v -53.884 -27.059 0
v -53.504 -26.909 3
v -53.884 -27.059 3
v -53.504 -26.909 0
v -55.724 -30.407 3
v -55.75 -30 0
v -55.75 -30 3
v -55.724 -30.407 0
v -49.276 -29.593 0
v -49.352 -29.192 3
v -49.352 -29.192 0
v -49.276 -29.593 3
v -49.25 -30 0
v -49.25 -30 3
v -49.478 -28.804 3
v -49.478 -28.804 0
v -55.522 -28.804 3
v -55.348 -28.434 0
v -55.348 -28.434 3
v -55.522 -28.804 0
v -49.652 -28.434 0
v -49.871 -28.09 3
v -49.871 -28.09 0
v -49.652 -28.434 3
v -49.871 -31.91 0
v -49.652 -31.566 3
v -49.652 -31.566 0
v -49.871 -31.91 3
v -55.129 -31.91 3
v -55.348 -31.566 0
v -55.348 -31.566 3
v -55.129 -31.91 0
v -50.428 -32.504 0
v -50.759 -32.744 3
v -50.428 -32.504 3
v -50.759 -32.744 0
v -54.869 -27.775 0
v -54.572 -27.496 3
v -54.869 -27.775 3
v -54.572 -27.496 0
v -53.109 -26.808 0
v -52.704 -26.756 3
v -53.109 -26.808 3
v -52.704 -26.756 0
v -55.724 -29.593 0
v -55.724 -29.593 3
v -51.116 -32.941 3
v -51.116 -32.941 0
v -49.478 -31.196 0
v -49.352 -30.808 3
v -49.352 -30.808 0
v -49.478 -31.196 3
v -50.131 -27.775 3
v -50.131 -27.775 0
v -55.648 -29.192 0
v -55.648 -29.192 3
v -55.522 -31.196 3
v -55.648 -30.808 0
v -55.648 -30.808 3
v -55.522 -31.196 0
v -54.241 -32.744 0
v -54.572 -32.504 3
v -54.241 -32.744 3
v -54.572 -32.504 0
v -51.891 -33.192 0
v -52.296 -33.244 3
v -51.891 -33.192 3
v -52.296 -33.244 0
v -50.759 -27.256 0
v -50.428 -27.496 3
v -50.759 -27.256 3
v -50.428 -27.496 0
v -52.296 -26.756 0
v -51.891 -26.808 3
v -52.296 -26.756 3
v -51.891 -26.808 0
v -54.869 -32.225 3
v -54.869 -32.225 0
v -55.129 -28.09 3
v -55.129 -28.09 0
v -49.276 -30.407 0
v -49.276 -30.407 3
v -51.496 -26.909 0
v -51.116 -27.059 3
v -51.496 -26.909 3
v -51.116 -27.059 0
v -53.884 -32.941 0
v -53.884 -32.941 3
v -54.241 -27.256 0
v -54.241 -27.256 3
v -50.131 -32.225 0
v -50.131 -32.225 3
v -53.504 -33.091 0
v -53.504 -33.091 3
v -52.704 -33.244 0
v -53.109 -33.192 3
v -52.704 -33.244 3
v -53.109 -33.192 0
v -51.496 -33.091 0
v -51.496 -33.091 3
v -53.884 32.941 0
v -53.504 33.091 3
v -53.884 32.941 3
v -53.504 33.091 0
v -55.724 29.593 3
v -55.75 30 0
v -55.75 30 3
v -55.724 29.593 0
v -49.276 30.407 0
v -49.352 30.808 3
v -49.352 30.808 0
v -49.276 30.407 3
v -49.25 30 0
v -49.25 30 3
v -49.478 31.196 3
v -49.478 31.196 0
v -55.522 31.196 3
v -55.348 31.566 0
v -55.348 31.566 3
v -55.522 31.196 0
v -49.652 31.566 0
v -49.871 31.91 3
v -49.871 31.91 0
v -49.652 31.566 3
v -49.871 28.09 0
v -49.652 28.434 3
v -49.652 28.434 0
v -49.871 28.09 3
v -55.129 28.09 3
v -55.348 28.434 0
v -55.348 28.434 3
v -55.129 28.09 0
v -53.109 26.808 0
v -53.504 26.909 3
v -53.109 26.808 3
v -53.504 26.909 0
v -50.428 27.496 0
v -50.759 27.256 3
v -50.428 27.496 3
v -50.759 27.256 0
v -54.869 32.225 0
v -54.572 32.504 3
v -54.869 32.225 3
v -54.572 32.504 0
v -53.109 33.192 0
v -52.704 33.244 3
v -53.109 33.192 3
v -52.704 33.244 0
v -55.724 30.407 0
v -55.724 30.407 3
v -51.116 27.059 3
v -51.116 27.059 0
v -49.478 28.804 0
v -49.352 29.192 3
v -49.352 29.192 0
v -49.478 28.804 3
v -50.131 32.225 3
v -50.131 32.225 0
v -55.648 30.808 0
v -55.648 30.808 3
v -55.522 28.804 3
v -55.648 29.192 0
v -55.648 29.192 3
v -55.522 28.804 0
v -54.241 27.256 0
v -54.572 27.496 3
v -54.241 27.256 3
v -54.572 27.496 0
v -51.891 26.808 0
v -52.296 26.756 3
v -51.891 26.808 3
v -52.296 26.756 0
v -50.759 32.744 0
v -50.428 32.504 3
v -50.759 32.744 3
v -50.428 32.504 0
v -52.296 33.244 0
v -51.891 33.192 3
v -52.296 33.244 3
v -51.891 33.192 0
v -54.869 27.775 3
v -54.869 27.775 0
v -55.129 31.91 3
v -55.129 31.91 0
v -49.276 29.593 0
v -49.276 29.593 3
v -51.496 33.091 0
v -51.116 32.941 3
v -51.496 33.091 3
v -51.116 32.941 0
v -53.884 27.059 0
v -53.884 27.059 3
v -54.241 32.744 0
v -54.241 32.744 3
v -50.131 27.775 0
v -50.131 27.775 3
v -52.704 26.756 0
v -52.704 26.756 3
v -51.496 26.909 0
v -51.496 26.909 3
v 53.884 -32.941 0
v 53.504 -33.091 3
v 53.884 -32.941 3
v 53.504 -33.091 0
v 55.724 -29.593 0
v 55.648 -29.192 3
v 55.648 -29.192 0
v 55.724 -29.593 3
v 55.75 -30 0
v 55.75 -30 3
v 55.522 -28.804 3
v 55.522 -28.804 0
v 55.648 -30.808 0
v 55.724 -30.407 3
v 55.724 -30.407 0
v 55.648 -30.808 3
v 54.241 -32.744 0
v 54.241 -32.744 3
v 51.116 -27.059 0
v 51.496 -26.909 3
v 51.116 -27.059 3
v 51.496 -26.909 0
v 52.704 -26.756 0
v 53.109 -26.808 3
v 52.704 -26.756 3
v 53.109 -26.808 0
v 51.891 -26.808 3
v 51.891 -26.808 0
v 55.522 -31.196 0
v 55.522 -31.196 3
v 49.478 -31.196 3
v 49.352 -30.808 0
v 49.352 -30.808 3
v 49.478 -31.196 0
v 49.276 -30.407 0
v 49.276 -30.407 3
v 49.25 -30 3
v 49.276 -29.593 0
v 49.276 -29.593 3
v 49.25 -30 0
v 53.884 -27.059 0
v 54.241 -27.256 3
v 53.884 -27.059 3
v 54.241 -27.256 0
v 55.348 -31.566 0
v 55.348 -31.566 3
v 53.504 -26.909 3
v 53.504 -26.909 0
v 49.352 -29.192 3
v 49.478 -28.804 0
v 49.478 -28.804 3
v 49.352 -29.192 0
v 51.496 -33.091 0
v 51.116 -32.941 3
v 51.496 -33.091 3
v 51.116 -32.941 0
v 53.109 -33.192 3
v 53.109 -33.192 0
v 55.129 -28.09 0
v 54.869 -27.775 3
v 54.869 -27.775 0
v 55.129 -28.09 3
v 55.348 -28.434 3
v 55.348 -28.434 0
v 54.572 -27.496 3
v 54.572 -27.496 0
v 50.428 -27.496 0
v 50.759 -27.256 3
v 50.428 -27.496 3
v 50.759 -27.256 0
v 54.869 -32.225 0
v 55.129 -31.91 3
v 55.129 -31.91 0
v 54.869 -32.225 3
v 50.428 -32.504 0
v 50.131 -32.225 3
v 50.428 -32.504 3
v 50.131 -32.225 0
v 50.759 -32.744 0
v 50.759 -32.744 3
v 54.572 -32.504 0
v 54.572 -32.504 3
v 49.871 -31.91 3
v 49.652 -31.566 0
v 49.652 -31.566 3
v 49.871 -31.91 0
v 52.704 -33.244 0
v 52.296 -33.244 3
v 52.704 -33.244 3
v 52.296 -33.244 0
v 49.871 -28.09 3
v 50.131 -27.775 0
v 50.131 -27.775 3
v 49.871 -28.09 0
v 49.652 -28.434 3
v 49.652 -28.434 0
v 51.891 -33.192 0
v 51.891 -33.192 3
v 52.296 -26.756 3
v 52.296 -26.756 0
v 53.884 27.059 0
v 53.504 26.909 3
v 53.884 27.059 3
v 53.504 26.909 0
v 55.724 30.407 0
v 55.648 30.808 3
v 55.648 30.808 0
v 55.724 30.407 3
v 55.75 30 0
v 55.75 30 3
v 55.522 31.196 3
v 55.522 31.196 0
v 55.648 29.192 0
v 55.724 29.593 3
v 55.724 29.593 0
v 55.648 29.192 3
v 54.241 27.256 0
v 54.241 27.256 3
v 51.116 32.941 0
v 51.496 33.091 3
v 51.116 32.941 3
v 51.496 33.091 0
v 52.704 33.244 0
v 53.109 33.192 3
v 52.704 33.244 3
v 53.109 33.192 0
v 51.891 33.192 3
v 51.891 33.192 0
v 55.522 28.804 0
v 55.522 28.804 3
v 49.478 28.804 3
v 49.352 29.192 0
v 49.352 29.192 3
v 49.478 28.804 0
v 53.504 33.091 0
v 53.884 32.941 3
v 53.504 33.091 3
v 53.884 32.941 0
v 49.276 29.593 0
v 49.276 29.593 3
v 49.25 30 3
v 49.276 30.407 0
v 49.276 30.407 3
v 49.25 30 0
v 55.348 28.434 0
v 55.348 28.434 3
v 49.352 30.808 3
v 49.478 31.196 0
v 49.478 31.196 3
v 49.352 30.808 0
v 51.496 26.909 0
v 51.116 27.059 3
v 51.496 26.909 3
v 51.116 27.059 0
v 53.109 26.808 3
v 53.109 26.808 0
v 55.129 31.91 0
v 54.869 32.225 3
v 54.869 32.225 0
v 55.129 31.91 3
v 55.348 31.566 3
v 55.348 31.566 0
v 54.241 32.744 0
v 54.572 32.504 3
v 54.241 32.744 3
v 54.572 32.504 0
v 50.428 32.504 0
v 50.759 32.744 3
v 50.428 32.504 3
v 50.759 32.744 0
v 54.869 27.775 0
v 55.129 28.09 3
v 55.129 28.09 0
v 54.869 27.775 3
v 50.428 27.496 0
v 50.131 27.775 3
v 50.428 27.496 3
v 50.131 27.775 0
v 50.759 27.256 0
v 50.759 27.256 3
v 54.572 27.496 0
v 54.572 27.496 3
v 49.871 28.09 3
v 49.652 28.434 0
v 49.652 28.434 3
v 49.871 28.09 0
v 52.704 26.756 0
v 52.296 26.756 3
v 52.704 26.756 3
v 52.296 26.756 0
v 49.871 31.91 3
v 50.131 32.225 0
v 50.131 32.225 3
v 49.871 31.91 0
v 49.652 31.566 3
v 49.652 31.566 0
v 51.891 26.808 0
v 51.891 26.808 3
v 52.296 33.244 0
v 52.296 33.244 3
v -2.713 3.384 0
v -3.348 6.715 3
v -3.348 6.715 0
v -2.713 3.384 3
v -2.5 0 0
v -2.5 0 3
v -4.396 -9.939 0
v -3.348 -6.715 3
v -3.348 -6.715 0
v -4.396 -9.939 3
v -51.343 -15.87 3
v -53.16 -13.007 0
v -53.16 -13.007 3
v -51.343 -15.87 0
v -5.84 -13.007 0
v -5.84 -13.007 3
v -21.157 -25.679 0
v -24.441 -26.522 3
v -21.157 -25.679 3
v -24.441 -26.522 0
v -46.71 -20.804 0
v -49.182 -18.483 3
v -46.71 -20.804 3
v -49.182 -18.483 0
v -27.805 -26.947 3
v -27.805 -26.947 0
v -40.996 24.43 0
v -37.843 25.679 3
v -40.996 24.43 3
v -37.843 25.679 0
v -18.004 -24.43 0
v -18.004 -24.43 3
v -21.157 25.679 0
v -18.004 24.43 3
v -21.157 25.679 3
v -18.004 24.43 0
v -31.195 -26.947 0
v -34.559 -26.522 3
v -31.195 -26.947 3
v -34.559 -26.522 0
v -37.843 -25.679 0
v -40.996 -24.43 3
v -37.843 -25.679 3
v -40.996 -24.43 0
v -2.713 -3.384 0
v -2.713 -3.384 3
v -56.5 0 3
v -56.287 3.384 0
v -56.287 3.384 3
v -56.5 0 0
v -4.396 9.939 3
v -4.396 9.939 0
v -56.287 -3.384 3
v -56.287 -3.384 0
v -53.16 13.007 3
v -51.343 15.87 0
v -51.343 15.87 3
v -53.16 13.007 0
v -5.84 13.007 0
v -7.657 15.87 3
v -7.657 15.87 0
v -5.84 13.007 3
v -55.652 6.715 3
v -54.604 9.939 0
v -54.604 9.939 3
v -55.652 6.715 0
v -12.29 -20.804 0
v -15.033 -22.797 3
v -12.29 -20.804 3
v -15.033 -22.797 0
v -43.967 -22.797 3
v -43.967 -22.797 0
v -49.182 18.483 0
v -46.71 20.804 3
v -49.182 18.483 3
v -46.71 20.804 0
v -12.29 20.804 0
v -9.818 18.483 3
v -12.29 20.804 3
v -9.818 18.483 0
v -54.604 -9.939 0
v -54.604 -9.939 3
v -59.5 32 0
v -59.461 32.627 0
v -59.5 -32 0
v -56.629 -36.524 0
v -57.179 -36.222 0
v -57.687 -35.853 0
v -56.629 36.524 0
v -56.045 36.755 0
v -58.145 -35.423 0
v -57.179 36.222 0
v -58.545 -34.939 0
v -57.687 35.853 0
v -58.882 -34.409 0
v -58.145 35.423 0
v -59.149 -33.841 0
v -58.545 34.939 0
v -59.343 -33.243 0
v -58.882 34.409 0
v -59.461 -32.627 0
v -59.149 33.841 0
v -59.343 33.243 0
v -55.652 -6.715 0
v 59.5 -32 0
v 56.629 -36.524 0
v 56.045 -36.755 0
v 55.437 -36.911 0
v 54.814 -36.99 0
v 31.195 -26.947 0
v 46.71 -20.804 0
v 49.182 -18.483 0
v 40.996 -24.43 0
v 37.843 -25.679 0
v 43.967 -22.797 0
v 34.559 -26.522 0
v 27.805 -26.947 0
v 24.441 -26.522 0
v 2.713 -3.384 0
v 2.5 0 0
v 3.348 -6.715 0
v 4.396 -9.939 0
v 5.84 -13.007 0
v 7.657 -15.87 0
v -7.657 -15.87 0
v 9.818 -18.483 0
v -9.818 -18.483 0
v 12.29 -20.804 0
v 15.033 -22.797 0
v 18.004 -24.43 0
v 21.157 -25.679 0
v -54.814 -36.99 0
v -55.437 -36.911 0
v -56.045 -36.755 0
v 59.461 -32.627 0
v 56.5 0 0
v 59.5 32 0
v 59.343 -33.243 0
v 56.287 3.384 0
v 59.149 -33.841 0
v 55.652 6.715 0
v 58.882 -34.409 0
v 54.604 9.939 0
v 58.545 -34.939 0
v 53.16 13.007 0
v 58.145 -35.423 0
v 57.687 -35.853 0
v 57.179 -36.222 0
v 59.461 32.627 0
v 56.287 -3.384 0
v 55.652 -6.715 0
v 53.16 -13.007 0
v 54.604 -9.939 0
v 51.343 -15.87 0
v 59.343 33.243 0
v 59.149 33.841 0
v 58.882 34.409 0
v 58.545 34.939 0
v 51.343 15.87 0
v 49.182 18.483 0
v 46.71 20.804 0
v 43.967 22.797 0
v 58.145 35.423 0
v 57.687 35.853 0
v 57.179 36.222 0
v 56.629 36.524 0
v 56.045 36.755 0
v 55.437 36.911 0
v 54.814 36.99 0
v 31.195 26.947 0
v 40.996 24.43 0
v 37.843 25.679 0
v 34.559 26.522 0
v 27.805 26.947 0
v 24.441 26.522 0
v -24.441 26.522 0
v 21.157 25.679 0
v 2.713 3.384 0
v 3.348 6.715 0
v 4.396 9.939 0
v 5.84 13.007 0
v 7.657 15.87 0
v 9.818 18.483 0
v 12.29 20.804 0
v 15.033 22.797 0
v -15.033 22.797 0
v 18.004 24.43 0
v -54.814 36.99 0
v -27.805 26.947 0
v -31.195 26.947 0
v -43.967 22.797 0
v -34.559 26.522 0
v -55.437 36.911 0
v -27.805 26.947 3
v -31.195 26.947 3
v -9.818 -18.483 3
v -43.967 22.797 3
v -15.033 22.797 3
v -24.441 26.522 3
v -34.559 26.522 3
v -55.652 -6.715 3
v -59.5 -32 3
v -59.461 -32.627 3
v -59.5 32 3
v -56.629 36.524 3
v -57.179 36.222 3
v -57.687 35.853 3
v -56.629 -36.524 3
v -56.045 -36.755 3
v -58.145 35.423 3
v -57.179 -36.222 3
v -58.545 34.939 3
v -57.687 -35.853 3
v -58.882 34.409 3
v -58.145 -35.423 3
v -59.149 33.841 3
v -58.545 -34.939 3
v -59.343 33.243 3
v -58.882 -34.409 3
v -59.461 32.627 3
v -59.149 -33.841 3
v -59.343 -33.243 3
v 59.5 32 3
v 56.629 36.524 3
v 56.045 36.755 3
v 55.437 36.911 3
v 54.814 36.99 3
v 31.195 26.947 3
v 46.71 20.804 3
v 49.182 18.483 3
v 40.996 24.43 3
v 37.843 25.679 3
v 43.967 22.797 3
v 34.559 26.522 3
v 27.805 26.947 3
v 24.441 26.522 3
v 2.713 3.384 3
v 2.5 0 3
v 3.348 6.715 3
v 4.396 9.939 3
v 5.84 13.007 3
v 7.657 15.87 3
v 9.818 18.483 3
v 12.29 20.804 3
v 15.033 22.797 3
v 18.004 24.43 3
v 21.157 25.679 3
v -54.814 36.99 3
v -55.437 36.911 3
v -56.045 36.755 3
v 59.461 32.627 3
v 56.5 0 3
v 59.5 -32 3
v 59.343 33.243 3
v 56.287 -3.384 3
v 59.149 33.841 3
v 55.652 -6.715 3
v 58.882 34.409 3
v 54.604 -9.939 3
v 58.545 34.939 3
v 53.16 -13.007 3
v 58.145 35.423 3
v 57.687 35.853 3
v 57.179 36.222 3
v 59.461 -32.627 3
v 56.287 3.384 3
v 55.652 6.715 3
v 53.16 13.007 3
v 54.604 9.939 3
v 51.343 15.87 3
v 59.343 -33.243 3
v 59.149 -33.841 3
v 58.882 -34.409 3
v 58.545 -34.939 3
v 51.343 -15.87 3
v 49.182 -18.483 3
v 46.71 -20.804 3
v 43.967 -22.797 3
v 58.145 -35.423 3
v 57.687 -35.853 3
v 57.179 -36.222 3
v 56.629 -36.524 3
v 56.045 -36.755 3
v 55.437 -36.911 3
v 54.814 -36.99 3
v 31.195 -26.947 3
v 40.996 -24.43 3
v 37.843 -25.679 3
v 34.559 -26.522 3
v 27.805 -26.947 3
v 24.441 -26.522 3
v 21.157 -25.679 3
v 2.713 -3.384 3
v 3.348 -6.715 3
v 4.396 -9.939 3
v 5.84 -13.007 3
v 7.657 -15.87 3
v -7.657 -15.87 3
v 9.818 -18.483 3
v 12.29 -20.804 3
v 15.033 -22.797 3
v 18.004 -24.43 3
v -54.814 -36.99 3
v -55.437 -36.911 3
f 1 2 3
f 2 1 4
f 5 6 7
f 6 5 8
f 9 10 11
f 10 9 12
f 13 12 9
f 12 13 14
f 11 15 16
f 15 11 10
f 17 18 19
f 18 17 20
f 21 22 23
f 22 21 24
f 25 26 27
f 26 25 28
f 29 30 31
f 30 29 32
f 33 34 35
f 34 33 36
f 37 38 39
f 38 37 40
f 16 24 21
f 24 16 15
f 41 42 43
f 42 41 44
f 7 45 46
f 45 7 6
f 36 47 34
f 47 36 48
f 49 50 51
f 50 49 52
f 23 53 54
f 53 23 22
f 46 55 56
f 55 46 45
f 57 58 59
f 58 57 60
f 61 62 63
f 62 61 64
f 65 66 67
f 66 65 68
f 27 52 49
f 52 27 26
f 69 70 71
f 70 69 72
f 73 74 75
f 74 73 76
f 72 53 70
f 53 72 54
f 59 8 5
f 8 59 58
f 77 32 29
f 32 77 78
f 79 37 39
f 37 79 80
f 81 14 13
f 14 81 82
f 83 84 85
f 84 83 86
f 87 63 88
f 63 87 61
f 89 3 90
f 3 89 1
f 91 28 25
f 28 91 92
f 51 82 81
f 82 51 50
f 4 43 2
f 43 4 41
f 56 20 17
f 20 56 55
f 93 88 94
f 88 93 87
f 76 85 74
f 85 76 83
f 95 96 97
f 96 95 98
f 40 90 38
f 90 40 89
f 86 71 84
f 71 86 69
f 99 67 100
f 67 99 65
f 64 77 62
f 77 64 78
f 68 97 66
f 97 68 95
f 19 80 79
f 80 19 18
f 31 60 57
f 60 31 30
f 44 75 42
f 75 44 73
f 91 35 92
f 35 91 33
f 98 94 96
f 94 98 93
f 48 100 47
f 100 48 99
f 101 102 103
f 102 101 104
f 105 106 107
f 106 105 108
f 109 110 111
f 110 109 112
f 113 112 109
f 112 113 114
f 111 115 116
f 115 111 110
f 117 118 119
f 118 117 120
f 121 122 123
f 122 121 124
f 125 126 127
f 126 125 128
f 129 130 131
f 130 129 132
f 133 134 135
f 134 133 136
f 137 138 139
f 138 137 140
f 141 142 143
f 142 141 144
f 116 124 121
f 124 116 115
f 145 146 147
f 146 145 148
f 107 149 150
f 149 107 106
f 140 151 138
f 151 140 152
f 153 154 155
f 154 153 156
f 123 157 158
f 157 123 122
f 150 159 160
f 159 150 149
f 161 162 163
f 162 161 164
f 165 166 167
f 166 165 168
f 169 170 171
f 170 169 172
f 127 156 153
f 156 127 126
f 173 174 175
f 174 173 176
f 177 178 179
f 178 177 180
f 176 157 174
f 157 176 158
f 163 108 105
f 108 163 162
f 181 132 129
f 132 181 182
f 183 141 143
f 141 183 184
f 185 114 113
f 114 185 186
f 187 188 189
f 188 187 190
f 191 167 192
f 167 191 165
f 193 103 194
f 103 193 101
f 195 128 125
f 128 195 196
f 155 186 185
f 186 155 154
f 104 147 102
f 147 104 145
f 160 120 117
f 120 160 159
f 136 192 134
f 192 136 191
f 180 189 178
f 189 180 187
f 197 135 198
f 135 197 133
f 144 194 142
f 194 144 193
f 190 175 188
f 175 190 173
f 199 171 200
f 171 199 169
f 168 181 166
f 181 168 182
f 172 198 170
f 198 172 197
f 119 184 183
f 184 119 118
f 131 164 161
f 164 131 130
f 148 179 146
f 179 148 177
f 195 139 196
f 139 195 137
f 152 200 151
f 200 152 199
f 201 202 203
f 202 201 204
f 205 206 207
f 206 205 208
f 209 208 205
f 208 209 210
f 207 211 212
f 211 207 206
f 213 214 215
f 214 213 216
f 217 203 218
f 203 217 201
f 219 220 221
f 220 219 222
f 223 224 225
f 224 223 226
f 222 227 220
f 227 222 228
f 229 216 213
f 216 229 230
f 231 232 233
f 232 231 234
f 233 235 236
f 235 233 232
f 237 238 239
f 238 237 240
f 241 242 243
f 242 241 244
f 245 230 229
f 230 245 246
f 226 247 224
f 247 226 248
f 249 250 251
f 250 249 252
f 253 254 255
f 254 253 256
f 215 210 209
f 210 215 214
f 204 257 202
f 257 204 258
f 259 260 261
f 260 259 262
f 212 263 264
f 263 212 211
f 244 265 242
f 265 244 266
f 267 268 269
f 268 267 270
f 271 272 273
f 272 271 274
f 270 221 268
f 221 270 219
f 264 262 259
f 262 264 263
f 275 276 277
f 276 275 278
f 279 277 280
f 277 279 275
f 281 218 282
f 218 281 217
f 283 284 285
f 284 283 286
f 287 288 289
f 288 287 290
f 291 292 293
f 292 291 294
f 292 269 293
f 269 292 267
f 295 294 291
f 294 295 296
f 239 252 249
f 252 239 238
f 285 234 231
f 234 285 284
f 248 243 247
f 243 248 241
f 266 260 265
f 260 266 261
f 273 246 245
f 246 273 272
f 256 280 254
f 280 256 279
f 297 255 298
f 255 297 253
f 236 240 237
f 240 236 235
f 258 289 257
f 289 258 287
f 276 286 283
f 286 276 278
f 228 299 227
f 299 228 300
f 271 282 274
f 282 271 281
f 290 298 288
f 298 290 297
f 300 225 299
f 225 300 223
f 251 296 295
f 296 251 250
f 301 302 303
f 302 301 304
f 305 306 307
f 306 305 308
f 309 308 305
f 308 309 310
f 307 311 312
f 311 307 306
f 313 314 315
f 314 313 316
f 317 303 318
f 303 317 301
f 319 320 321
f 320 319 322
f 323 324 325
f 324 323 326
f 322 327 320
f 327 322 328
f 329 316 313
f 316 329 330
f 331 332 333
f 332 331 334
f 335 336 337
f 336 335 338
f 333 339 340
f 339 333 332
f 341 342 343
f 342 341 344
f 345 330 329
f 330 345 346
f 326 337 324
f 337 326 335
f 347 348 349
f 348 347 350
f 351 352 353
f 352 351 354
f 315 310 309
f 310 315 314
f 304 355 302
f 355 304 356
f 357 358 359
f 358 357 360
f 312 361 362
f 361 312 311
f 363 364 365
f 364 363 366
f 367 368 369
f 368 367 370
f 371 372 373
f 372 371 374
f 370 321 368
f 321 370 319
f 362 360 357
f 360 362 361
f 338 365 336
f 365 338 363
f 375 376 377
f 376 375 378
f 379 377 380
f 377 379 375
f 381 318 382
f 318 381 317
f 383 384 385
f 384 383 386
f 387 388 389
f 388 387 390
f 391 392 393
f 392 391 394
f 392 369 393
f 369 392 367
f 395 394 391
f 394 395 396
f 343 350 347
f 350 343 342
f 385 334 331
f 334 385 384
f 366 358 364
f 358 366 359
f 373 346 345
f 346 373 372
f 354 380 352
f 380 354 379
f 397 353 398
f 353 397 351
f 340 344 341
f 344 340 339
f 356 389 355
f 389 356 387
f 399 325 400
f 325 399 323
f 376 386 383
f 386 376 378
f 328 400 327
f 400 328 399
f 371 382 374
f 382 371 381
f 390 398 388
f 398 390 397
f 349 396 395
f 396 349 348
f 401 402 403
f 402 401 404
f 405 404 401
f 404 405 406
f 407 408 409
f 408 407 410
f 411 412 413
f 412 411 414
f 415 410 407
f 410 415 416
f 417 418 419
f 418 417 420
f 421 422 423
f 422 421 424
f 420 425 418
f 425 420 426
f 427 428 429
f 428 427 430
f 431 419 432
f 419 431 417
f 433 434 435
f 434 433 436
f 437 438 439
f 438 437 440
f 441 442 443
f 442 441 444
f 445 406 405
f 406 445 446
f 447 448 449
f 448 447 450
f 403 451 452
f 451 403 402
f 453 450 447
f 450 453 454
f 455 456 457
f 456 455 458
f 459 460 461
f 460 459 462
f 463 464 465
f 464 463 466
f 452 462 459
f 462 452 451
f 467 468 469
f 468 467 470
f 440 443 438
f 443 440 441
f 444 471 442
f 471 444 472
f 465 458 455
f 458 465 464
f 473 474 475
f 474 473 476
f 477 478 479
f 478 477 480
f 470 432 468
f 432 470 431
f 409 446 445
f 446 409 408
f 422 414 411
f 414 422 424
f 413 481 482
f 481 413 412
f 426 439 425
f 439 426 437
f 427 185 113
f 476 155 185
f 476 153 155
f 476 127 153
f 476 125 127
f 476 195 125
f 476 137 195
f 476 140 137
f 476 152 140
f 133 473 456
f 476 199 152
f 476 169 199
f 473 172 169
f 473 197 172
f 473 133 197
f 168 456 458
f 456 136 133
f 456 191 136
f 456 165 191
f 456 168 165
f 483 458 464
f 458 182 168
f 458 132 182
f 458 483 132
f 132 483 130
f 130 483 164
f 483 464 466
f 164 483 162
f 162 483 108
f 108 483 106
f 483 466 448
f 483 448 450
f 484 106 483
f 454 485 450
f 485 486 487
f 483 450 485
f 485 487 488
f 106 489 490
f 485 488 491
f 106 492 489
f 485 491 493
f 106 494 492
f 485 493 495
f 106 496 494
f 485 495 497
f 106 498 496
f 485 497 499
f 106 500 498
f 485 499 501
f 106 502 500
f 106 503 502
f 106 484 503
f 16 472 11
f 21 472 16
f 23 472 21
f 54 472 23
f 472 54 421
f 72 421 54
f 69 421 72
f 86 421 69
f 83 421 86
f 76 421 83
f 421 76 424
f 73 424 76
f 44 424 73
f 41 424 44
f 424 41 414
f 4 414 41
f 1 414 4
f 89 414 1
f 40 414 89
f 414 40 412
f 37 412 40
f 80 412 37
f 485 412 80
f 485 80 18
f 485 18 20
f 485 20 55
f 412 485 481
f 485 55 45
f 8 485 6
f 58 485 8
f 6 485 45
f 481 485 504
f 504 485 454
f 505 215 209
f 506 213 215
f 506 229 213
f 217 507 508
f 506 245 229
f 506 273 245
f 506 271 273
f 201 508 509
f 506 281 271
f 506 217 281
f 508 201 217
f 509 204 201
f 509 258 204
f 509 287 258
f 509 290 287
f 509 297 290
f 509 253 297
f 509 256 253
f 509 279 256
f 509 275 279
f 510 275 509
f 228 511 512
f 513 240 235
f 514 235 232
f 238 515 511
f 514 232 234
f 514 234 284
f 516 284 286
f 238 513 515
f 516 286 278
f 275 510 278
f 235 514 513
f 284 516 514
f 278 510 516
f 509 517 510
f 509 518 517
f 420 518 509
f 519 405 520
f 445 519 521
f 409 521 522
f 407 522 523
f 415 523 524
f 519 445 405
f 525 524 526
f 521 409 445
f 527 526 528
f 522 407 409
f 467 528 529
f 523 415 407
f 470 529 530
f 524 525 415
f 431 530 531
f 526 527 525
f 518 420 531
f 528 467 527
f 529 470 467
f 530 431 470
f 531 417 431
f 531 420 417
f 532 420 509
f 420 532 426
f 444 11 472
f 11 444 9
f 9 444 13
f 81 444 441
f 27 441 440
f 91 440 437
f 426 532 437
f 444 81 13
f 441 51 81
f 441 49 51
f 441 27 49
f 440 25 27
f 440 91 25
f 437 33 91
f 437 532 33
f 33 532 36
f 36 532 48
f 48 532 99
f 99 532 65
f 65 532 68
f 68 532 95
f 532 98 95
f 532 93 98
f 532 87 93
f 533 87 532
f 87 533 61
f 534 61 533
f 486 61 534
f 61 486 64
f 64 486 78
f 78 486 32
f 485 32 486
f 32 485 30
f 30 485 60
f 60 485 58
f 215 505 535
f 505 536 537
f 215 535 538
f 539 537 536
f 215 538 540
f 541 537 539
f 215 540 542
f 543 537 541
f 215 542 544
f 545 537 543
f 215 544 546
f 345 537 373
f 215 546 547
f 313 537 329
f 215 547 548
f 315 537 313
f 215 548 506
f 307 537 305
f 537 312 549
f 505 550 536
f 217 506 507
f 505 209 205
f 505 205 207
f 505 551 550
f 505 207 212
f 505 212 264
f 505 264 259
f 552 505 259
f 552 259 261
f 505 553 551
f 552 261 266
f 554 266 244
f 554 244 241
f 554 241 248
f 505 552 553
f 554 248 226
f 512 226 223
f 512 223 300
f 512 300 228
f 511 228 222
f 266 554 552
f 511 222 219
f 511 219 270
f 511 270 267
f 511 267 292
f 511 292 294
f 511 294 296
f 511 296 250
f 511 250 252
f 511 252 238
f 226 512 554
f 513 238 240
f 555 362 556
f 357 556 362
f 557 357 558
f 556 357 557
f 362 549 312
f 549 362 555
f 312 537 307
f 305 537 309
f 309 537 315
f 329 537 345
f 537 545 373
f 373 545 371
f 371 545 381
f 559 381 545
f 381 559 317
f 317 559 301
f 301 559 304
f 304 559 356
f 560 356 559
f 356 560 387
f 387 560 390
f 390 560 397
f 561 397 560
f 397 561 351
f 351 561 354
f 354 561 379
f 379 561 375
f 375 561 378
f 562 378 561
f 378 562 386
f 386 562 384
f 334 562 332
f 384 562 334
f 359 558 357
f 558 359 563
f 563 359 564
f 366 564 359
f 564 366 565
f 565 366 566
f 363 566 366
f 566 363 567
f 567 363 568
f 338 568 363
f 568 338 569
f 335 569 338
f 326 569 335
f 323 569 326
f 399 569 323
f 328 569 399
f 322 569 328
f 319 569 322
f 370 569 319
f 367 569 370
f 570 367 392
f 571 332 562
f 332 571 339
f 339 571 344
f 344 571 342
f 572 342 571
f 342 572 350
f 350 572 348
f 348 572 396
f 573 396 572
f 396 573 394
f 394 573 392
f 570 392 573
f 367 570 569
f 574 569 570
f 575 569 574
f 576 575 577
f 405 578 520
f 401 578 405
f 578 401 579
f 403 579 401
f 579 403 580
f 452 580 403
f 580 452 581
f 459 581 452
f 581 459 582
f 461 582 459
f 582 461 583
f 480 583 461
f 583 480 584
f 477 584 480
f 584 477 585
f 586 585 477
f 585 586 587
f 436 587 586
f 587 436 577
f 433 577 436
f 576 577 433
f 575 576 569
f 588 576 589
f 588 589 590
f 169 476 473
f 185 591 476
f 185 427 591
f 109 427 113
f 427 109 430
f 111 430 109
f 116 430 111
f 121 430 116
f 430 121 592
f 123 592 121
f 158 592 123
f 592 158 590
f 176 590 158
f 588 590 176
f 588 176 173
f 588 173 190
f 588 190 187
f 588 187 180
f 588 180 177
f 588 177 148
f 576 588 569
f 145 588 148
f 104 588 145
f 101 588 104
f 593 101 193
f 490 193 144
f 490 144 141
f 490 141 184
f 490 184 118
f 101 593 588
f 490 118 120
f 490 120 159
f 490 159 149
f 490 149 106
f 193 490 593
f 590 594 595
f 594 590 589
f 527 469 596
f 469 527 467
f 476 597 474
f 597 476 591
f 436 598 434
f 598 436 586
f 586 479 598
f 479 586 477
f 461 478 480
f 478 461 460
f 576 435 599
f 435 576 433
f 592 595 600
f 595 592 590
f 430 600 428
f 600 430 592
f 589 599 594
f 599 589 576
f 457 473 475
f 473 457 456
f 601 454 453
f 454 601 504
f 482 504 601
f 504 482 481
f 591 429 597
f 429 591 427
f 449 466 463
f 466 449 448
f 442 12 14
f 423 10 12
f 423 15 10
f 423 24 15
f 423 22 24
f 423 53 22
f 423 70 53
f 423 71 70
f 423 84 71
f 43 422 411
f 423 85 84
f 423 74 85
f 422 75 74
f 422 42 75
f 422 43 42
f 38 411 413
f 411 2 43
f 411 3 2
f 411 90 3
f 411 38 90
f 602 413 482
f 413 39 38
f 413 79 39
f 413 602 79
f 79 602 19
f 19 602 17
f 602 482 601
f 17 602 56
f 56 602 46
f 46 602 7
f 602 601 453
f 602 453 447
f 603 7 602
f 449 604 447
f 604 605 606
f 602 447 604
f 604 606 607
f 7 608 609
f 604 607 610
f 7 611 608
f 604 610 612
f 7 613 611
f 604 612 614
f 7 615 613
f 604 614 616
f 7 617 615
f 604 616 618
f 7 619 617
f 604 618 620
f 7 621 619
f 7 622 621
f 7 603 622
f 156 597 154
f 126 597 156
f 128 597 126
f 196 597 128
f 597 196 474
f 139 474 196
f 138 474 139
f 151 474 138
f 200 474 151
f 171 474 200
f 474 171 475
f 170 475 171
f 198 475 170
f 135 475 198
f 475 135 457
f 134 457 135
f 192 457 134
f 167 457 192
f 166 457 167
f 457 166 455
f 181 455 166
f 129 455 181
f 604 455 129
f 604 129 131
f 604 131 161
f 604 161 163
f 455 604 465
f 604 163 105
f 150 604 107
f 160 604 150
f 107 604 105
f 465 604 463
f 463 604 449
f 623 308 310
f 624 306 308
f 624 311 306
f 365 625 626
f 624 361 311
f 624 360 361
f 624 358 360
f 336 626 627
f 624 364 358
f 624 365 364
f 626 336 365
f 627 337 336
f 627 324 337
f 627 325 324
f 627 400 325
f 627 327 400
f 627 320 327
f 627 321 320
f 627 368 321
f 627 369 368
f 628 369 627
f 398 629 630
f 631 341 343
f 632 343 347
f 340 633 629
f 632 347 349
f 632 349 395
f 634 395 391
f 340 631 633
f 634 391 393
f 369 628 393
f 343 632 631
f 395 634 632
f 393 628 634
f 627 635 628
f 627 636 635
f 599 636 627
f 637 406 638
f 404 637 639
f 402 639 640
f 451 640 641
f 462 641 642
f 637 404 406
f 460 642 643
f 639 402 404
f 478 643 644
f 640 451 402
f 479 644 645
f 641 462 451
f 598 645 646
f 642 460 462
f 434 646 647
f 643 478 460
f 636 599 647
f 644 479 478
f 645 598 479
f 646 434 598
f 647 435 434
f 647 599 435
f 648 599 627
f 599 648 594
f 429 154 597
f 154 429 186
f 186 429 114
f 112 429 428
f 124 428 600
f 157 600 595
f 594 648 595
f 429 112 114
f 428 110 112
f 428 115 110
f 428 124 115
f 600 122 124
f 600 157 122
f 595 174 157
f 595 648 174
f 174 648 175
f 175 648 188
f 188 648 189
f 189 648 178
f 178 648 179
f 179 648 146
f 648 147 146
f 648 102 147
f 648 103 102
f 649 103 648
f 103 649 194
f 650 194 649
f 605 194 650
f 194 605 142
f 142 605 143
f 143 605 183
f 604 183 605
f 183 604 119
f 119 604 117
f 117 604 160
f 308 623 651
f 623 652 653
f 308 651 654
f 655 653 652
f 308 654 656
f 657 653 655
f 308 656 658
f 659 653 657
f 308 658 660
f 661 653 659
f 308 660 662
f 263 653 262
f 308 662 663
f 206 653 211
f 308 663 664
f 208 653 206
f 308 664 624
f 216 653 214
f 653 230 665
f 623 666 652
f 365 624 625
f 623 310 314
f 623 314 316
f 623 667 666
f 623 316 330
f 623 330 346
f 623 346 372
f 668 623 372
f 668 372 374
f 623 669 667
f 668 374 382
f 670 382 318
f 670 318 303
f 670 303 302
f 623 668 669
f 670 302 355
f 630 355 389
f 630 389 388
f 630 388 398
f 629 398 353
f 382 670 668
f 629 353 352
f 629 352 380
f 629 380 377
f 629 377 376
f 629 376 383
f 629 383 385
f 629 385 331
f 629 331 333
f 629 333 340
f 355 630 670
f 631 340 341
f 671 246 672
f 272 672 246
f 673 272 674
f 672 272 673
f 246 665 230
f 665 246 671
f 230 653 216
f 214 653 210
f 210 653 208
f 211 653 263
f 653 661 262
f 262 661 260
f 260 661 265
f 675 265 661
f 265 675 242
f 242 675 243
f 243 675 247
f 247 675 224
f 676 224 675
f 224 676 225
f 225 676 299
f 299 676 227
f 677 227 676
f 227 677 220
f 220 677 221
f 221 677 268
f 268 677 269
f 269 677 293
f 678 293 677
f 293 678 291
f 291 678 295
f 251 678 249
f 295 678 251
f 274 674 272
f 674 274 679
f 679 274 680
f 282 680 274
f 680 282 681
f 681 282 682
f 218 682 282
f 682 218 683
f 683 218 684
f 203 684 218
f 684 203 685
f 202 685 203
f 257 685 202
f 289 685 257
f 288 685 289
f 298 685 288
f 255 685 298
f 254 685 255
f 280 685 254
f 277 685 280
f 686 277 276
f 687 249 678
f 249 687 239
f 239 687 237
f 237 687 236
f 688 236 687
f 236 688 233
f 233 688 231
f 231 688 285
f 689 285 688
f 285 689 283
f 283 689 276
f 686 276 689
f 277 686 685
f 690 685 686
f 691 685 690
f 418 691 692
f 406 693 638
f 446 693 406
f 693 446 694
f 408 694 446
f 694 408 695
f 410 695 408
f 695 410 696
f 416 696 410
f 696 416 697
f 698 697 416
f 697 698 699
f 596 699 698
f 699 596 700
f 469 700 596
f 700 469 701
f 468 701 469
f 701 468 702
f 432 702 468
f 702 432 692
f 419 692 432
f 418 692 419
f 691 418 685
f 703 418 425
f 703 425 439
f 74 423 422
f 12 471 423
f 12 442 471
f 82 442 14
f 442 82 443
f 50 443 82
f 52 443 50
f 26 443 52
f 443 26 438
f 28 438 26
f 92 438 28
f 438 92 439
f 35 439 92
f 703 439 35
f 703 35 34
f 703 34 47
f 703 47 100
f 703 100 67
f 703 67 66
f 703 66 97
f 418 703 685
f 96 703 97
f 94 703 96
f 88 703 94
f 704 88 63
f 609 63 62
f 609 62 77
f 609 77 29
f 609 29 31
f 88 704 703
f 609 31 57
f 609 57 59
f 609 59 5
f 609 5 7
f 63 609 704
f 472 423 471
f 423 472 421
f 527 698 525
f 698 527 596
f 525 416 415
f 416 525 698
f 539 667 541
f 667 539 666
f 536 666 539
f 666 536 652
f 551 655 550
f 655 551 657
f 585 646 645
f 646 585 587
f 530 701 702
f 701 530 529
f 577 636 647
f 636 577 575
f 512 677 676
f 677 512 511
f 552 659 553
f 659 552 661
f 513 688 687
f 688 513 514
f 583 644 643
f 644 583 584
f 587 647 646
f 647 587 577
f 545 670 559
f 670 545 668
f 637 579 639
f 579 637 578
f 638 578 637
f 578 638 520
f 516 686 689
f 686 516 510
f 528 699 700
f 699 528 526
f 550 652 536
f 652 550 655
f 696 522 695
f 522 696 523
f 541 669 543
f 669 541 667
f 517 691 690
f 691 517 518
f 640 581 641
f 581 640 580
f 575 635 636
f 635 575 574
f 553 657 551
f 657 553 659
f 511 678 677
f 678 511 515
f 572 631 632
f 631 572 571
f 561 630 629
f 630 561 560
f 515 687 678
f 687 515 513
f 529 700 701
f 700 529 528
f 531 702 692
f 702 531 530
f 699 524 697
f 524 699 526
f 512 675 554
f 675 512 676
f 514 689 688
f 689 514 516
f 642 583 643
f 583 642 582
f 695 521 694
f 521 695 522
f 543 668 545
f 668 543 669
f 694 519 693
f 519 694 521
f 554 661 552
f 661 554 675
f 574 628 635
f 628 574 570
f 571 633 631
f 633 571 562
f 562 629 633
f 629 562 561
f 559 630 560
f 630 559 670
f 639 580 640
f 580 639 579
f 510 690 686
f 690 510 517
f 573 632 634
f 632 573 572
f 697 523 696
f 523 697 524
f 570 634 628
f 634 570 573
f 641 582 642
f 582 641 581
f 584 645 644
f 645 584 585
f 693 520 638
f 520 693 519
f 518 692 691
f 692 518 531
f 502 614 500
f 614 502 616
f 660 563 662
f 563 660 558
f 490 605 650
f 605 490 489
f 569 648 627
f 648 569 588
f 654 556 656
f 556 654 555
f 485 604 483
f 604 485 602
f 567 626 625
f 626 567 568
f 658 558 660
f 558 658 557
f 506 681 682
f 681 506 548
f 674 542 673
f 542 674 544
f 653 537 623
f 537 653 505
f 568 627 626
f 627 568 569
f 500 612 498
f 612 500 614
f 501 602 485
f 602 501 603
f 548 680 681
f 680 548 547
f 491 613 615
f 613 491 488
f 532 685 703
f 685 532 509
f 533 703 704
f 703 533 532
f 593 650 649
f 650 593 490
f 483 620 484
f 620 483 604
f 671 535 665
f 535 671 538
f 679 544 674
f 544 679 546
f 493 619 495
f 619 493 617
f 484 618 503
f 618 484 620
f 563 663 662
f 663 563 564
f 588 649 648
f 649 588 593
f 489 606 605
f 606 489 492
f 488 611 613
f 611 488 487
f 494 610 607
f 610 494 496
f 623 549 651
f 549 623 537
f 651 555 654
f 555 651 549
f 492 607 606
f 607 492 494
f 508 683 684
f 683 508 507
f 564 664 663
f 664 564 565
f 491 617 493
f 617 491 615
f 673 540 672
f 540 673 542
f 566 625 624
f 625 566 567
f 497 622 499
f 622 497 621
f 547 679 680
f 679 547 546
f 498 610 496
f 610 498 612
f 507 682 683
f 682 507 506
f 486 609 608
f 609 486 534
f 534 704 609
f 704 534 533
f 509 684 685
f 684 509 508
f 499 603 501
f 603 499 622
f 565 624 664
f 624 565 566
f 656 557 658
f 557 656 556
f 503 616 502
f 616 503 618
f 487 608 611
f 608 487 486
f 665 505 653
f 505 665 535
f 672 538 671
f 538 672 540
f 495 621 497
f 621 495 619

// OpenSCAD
$fn = 50;

difference() {
	union() {
		hull() {
			translate(v = [-54.5, 32.0, 0]) {
				cylinder(h = 3, r = 5);
			}
			translate(v = [54.5, 32.0, 0]) {
				cylinder(h = 3, r = 5);
			}
			translate(v = [-54.5, -32.0, 0]) {
				cylinder(h = 3, r = 5);
			}
			translate(v = [54.5, -32.0, 0]) {
				cylinder(h = 3, r = 5);
			}
		}
	}
	union() {
		translate(v = [-52.5, -30.0, -100.0]) {
			cylinder(h = 200, r = 3.25);
		}
		translate(v = [-52.5, 30.0, -100.0]) {
			cylinder(h = 200, r = 3.25);
		}
		translate(v = [52.5, -30.0, -100.0]) {
			cylinder(h = 200, r = 3.25);
		}
		translate(v = [52.5, 30.0, -100.0]) {
			cylinder(h = 200, r = 3.25);
		}
		translate(v = [-52.5, -30.0, -100.0]) {
			cylinder(h = 200, r = 1.8);
		}
		translate(v = [-52.5, 30.0, -100.0]) {
			cylinder(h = 200, r = 1.8);
		}
		translate(v = [52.5, -30.0, -100.0]) {
			cylinder(h = 200, r = 1.8);
		}
		translate(v = [52.5, 30.0, -100.0]) {
			cylinder(h = 200, r = 1.8);
		}
		translate(v = [-29.5, 0, 0.0]) {
			cylinder(h = 3, r = 27.0);
		}
		translate(v = [29.5, 0, 0.0]) {
			cylinder(h = 3, r = 27.0);
		}
	}
}
